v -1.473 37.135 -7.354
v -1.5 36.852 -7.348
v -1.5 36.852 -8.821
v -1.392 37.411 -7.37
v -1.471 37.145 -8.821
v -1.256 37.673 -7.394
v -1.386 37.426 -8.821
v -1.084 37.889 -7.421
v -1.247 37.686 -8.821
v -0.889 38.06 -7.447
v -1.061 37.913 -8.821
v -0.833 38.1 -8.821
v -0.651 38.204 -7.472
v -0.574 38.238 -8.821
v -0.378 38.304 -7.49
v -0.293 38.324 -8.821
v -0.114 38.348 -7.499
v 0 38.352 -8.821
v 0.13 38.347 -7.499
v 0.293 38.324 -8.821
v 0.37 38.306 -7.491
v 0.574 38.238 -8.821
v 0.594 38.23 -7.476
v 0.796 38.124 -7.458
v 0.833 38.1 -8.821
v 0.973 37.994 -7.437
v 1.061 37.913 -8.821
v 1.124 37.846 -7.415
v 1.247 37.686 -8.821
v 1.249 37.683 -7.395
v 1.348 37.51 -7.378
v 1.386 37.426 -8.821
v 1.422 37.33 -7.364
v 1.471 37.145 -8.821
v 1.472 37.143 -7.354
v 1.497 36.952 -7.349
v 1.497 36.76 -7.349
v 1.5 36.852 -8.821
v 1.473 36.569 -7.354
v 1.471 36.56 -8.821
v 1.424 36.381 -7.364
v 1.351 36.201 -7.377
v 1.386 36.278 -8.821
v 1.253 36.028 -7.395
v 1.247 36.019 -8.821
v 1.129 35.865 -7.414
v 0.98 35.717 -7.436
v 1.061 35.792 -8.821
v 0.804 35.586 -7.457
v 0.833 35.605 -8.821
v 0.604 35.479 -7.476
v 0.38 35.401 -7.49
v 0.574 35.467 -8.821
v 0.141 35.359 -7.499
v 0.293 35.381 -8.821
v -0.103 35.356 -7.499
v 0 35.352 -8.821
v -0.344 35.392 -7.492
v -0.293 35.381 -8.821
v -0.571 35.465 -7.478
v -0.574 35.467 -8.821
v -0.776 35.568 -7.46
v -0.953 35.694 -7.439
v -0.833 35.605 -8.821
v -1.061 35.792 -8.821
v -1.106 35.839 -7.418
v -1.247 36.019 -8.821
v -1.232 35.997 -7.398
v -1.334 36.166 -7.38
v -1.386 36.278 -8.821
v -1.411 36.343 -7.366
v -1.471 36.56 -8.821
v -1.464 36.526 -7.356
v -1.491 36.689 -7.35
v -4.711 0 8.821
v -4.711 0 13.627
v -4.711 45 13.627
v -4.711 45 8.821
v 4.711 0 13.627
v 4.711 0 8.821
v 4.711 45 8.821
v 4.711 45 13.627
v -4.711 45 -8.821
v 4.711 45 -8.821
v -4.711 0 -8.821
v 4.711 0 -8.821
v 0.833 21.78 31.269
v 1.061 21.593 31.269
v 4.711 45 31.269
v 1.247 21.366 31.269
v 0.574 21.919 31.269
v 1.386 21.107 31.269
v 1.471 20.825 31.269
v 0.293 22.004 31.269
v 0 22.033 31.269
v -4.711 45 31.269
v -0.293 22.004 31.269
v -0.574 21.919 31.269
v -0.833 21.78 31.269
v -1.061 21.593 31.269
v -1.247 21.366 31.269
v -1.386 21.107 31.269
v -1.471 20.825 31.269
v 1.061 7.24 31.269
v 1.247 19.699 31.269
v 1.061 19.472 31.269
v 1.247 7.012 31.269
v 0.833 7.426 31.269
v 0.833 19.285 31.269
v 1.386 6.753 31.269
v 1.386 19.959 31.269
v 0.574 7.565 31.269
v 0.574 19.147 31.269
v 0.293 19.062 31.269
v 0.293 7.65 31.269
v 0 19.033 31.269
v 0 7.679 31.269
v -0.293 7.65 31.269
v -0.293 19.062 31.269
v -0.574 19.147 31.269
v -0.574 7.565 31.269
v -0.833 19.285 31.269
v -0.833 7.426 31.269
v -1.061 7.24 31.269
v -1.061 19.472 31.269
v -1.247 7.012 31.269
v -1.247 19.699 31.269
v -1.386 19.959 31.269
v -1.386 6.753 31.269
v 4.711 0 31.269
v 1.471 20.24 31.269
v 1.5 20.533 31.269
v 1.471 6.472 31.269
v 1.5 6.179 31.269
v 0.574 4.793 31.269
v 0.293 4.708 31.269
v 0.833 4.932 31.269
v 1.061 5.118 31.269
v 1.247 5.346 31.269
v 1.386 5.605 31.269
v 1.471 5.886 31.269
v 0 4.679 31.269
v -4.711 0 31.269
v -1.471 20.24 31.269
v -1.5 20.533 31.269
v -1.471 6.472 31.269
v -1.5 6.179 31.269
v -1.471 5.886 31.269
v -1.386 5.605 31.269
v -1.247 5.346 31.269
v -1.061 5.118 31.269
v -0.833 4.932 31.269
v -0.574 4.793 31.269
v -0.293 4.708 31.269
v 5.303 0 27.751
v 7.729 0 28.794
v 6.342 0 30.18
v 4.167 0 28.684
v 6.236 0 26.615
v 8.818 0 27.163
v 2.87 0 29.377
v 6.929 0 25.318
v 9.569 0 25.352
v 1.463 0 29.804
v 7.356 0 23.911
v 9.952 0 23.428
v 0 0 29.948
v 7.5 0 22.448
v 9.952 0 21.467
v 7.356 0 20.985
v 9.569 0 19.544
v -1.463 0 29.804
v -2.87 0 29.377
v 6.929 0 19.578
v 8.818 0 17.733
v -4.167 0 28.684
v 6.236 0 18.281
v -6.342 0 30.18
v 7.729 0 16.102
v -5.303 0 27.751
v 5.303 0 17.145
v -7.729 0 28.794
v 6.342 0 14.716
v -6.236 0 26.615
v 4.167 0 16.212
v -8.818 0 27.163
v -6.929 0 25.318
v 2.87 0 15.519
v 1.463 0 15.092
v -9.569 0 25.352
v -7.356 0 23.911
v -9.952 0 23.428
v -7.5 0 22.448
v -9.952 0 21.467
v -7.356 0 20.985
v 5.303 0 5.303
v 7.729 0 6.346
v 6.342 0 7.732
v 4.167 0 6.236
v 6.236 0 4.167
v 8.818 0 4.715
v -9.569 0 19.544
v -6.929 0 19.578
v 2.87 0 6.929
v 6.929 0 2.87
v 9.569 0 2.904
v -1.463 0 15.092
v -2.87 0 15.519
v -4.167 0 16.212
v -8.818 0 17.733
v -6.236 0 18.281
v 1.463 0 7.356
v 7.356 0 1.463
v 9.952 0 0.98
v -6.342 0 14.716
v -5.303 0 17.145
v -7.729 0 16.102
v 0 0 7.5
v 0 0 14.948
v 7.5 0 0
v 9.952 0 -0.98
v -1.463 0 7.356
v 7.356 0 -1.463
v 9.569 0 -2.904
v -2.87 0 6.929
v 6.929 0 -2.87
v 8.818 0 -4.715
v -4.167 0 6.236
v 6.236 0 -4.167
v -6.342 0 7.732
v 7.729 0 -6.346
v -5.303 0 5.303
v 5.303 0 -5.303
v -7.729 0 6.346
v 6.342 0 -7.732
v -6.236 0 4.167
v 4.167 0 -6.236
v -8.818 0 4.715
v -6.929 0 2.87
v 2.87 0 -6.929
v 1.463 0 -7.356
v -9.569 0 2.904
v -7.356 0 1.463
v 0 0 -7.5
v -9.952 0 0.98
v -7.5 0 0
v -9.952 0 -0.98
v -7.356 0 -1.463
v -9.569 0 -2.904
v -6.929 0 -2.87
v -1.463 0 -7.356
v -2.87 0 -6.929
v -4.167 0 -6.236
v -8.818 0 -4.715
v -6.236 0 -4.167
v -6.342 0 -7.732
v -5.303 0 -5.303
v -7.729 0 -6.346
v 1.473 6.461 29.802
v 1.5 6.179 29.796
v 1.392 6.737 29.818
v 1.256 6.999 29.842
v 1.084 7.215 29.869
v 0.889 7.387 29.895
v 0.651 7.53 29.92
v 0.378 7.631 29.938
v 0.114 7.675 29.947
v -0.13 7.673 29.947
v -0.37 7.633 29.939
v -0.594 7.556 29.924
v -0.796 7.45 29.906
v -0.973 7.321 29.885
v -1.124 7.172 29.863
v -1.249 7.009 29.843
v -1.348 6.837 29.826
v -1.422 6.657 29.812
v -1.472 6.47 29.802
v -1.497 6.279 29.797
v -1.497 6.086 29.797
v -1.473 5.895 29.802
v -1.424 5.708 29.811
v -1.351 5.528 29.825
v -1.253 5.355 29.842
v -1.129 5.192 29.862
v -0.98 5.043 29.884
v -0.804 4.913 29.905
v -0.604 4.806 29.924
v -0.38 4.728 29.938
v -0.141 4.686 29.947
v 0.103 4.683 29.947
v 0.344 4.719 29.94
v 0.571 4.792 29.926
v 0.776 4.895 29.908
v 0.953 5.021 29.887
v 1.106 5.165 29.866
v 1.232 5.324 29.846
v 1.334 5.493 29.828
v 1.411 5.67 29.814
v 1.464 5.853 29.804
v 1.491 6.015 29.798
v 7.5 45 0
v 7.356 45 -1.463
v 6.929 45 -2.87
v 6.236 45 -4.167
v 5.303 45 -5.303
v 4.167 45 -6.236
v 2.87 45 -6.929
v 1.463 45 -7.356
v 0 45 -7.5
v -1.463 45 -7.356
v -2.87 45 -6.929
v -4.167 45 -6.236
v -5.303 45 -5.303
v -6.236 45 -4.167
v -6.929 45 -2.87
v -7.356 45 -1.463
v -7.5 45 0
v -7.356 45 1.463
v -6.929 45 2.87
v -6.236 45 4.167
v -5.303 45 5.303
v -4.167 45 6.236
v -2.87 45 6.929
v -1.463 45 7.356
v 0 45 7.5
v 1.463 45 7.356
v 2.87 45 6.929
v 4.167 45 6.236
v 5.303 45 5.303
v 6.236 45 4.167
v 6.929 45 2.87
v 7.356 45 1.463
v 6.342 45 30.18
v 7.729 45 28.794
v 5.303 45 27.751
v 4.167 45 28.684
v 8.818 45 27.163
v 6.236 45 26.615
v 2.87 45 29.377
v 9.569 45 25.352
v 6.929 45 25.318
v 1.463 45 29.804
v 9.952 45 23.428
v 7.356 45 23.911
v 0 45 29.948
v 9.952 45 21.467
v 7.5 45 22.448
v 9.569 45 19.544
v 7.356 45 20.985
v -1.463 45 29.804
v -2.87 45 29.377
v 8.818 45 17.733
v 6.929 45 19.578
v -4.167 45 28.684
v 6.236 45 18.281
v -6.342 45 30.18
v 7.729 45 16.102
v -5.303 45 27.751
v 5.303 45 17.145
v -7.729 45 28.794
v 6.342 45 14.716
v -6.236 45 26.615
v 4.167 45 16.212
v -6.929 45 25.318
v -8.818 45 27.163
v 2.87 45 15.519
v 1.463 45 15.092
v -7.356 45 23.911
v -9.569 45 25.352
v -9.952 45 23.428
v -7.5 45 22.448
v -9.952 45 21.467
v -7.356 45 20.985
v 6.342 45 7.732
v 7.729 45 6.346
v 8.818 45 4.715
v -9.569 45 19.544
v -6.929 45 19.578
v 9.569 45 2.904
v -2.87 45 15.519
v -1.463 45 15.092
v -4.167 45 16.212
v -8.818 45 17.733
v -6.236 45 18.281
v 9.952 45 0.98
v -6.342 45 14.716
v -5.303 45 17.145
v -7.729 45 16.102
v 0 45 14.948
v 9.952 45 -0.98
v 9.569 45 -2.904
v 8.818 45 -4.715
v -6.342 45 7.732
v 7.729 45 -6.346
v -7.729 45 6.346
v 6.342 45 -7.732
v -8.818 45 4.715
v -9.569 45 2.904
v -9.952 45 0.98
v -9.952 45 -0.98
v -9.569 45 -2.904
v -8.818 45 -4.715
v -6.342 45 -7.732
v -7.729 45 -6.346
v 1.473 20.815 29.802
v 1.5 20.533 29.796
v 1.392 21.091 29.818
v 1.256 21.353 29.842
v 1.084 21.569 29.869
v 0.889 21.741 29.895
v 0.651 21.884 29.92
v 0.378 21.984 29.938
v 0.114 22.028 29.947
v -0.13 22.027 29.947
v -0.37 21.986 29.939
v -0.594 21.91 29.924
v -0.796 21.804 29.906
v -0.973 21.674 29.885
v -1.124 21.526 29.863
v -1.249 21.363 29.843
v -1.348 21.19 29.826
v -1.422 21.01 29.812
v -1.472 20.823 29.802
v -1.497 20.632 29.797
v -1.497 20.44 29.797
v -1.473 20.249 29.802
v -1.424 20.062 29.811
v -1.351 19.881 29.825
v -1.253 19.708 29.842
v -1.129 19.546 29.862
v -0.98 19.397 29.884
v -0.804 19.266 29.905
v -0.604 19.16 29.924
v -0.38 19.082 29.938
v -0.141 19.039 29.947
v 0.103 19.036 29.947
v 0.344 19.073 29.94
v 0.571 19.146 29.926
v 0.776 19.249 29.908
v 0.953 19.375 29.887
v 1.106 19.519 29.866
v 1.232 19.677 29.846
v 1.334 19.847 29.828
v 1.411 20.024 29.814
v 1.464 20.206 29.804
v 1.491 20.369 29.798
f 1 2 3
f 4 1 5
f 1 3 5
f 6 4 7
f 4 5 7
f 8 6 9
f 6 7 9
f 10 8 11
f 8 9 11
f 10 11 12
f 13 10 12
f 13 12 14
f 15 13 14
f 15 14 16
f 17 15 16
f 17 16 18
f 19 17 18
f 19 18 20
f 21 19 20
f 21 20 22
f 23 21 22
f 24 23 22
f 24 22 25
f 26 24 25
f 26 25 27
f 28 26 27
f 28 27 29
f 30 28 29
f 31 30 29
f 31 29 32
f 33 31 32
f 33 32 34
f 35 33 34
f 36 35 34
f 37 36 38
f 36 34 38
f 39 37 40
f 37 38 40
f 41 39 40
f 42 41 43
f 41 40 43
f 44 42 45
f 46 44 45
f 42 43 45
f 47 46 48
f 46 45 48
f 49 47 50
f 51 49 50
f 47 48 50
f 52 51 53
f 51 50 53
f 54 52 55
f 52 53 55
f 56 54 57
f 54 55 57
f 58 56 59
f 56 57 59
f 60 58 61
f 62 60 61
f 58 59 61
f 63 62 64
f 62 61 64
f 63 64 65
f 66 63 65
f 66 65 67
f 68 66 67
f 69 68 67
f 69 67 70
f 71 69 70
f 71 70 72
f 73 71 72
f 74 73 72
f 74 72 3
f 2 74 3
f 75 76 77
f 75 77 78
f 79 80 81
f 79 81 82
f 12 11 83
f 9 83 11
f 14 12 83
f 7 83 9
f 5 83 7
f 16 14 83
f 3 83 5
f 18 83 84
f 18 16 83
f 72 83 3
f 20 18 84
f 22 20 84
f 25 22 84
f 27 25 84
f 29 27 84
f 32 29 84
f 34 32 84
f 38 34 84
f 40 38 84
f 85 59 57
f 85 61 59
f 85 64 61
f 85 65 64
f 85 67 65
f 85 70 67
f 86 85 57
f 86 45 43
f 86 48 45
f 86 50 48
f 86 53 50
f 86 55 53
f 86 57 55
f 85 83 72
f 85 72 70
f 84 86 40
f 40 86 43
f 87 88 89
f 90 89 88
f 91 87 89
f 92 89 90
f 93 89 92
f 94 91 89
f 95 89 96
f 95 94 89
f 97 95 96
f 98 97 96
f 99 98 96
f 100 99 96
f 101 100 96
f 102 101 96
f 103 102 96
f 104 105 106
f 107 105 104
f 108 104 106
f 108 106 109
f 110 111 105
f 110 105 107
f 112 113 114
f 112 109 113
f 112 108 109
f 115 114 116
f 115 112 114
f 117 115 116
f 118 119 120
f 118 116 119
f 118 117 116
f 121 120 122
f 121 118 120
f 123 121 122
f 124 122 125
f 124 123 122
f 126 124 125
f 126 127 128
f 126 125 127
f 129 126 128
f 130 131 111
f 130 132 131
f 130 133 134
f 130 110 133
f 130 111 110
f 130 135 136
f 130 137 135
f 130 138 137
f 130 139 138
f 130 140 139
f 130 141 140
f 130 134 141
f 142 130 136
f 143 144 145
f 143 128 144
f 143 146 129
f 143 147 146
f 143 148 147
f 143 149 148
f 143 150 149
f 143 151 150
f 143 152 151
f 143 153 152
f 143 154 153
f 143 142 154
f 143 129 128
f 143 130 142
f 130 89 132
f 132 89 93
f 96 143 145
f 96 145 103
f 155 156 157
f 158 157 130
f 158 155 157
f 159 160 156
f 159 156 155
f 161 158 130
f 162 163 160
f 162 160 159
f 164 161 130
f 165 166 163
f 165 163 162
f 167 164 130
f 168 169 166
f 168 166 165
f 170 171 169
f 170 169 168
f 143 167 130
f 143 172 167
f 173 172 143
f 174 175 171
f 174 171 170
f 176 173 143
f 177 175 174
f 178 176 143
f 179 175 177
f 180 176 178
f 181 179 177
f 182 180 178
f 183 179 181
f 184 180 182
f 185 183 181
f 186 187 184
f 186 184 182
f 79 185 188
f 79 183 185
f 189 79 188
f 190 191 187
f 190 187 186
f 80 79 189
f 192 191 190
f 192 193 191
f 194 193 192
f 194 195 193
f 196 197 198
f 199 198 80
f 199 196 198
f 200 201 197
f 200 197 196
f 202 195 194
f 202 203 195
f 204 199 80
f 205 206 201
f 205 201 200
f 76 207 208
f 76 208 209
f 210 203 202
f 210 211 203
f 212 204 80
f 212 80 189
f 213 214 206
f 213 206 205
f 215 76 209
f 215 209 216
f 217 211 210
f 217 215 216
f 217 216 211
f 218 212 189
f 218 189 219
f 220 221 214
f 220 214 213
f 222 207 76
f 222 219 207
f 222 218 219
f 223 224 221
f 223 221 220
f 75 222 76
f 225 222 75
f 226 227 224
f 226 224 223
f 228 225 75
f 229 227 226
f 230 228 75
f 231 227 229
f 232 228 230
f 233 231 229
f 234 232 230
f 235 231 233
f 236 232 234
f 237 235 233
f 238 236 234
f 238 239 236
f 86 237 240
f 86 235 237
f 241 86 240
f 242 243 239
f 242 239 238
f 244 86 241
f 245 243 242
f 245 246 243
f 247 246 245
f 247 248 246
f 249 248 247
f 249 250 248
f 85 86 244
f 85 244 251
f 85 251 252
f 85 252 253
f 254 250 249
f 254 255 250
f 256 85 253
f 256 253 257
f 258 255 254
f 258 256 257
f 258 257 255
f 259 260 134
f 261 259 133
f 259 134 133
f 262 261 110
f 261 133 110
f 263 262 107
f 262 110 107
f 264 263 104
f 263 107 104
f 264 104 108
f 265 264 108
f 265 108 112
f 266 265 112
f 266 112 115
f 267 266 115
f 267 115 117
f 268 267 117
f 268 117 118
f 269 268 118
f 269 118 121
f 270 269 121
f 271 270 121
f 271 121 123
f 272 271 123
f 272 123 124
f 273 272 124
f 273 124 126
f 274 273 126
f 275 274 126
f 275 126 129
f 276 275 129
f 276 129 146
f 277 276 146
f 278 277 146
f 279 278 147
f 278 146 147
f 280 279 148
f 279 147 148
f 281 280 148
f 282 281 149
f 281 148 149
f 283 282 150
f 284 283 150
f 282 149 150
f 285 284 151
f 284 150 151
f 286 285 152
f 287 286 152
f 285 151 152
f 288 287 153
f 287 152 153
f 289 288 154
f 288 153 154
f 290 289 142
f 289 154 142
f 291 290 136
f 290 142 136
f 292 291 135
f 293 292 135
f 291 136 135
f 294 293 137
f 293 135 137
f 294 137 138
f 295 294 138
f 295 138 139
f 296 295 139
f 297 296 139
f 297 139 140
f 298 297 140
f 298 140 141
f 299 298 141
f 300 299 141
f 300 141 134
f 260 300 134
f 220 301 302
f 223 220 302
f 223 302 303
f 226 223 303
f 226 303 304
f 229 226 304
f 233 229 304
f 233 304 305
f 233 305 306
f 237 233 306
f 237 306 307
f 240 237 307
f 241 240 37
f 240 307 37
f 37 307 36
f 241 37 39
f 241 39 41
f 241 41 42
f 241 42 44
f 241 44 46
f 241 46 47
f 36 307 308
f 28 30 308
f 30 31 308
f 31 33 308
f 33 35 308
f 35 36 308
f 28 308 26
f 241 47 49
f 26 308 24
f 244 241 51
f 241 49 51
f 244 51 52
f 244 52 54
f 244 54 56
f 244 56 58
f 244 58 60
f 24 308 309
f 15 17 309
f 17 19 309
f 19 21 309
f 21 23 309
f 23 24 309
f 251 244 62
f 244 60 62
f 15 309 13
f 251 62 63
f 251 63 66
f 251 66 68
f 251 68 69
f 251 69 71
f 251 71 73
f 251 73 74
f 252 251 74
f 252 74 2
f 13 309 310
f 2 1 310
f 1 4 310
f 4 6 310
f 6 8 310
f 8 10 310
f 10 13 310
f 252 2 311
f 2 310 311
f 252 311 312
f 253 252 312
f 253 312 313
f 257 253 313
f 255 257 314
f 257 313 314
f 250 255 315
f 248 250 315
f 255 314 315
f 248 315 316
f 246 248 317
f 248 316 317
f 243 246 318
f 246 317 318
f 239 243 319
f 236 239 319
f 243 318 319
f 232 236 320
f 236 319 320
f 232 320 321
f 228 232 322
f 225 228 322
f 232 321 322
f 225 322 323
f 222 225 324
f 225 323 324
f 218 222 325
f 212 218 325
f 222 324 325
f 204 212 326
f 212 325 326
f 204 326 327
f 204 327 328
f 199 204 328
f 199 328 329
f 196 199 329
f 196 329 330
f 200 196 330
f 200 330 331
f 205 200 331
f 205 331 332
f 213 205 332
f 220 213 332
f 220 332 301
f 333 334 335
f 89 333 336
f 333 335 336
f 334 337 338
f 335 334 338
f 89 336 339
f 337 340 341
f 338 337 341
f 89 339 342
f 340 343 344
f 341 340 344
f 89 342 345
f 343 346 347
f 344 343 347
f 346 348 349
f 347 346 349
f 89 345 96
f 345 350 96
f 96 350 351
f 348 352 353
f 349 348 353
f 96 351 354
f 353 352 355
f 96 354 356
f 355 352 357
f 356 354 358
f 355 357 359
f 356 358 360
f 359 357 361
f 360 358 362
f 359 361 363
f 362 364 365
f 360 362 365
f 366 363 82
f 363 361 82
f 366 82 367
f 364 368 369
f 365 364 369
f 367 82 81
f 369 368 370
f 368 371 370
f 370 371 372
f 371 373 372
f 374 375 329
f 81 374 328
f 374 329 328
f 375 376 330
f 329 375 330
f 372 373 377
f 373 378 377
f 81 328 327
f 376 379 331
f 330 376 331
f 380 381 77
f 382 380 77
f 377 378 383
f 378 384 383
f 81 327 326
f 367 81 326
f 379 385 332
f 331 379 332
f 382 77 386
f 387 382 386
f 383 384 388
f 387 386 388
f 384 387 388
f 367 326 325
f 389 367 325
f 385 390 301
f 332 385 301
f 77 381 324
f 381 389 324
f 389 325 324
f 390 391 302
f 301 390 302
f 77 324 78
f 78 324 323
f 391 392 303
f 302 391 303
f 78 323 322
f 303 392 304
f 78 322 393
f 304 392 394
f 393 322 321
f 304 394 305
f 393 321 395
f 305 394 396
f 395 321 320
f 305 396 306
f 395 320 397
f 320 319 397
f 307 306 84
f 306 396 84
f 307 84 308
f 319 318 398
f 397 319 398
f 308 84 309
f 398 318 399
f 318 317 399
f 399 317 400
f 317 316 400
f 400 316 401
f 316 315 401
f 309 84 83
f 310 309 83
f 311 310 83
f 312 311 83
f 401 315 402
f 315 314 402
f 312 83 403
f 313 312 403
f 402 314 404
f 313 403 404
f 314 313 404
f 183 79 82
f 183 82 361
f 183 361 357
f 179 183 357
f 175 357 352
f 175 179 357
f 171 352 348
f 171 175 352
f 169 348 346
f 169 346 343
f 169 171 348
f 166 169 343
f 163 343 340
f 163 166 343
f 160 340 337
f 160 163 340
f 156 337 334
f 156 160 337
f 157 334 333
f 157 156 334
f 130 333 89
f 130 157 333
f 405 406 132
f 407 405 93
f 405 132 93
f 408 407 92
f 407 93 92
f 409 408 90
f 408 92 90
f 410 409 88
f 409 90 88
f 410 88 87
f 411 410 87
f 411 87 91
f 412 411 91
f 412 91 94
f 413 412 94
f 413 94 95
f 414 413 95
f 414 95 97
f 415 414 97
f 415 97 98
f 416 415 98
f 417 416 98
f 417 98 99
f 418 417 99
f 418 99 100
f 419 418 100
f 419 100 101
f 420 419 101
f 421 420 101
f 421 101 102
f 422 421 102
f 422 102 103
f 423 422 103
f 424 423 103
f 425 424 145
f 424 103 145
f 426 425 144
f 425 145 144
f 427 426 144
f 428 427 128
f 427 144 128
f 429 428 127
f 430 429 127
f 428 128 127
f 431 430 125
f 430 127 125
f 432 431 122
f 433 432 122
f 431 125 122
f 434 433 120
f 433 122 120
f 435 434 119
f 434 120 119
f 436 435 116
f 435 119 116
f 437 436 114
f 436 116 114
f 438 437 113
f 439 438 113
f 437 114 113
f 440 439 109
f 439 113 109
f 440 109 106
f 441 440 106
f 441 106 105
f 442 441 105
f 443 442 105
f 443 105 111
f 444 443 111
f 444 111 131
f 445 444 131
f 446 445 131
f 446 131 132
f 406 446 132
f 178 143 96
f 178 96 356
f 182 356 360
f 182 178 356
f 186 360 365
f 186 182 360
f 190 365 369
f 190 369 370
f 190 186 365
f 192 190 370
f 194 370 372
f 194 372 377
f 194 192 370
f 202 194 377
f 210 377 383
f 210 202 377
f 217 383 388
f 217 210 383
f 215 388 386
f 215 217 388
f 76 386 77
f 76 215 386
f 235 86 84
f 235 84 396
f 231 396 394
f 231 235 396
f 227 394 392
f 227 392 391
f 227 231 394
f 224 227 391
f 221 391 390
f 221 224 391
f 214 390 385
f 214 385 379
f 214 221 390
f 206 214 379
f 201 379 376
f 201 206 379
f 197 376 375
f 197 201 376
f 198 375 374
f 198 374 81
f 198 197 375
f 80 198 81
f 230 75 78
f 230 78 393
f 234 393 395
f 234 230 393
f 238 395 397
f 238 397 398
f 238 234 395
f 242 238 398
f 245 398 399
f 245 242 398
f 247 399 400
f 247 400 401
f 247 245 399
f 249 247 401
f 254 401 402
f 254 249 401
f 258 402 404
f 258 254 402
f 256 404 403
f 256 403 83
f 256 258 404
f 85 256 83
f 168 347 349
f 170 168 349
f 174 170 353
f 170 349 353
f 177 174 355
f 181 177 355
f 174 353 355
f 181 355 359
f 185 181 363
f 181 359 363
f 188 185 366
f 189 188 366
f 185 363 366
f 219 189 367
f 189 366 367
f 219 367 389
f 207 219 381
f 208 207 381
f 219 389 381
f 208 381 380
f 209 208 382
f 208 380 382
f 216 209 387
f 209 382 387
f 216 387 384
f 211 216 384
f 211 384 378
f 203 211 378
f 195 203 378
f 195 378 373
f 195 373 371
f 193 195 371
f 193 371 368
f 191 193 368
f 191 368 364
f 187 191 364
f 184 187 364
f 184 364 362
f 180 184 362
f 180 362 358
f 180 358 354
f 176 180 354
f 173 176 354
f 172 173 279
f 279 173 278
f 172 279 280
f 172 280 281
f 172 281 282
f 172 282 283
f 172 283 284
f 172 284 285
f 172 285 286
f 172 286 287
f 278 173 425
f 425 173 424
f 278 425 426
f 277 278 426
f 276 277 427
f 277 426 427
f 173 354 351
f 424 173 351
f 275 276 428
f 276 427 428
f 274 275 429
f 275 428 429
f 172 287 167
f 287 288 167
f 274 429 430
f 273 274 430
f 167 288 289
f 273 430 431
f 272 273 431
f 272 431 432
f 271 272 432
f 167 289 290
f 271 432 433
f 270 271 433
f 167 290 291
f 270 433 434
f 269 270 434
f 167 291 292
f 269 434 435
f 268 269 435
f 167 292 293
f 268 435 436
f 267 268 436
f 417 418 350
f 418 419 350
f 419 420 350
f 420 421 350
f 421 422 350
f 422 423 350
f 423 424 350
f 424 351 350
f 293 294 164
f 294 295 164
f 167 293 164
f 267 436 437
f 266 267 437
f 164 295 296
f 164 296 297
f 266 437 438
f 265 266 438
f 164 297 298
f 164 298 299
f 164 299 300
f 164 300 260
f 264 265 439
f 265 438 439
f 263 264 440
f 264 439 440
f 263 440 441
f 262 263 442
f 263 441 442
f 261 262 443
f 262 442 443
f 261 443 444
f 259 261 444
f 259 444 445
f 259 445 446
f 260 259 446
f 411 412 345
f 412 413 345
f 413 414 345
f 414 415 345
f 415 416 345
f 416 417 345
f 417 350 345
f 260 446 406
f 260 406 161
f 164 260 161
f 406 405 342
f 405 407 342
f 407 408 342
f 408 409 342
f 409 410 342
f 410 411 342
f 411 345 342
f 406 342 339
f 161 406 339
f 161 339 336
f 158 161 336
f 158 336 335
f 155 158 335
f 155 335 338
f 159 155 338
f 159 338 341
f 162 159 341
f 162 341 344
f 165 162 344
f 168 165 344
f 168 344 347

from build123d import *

# Parameters (mm, degrees)
BOSS_EXTRUDE2_DEPTH = 45
SKETCH5_R           = 7.5
CUT_EXTRUDE2_DEPTH  = 48
SKETCH6_R           = 1.5
CUT_EXTRUDE3_DEPTH  = 5
SKETCH7_R           = 1.5
CUT_EXTRUDE4_DEPTH  = 10


with BuildPart() as part:
    # Sketch1 → Boss-Extrude2 (new body)
    with BuildSketch(Plane(origin=(0, 0, 0), x_dir=(1, 0, 0), z_dir=(0, 1, 0))):
        with BuildLine():
            Line((-4.710946187, 8.820826833), (4.710946187, 8.820826833))
            ThreePointArc((4.710946187, 8.820826833), (10, 0), (4.710946187, -8.820826833))
            Line((4.710946187, -8.820826833), (4.710946187, -13.627089834))
            ThreePointArc((4.710946187, -13.627089834), (10, -22.447916667), (4.710946187, -31.2687435))
            Line((4.710946187, -31.2687435), (-4.710946187, -31.2687435))
            ThreePointArc((-4.710946187, -31.2687435), (-10, -22.447916667), (-4.710946187, -13.627089834))
            Line((-4.710946187, -13.627089834), (-4.710946187, -8.820826833))
            ThreePointArc((-4.710946187, -8.820826833), (-10, 0), (-4.710946187, 8.820826833))
        make_face()
    extrude(amount=BOSS_EXTRUDE2_DEPTH)

    # Sketch5 → Cut-Extrude2 (cut)
    with BuildSketch(Plane(origin=(0, 45, 0), x_dir=(1, 0, 0), z_dir=(0, 1, 0))):
        Circle(SKETCH5_R)
        with Locations((0, -22.447916667)):
            Circle(SKETCH5_R)
    extrude(amount=-CUT_EXTRUDE2_DEPTH, mode=Mode.SUBTRACT)

    # Sketch6 → Cut-Extrude3 (cut)
    with BuildSketch(Plane.XY.offset(31.2687435)):
        with Locations((0, 20.532693815)):
            Circle(SKETCH6_R)
        with Locations((0, 6.178945615)):
            Circle(SKETCH6_R)
    extrude(amount=-CUT_EXTRUDE3_DEPTH, mode=Mode.SUBTRACT)

    # Sketch7 → Cut-Extrude4 (cut)
    with BuildSketch(Plane(origin=(0, 0, -8.820826833), x_dir=(-1, 0, 0), z_dir=(0, 0, -1))):
        with Locations((0, 36.852392065)):
            Circle(SKETCH7_R)
    extrude(amount=-CUT_EXTRUDE4_DEPTH, mode=Mode.SUBTRACT)


solid = part.part
